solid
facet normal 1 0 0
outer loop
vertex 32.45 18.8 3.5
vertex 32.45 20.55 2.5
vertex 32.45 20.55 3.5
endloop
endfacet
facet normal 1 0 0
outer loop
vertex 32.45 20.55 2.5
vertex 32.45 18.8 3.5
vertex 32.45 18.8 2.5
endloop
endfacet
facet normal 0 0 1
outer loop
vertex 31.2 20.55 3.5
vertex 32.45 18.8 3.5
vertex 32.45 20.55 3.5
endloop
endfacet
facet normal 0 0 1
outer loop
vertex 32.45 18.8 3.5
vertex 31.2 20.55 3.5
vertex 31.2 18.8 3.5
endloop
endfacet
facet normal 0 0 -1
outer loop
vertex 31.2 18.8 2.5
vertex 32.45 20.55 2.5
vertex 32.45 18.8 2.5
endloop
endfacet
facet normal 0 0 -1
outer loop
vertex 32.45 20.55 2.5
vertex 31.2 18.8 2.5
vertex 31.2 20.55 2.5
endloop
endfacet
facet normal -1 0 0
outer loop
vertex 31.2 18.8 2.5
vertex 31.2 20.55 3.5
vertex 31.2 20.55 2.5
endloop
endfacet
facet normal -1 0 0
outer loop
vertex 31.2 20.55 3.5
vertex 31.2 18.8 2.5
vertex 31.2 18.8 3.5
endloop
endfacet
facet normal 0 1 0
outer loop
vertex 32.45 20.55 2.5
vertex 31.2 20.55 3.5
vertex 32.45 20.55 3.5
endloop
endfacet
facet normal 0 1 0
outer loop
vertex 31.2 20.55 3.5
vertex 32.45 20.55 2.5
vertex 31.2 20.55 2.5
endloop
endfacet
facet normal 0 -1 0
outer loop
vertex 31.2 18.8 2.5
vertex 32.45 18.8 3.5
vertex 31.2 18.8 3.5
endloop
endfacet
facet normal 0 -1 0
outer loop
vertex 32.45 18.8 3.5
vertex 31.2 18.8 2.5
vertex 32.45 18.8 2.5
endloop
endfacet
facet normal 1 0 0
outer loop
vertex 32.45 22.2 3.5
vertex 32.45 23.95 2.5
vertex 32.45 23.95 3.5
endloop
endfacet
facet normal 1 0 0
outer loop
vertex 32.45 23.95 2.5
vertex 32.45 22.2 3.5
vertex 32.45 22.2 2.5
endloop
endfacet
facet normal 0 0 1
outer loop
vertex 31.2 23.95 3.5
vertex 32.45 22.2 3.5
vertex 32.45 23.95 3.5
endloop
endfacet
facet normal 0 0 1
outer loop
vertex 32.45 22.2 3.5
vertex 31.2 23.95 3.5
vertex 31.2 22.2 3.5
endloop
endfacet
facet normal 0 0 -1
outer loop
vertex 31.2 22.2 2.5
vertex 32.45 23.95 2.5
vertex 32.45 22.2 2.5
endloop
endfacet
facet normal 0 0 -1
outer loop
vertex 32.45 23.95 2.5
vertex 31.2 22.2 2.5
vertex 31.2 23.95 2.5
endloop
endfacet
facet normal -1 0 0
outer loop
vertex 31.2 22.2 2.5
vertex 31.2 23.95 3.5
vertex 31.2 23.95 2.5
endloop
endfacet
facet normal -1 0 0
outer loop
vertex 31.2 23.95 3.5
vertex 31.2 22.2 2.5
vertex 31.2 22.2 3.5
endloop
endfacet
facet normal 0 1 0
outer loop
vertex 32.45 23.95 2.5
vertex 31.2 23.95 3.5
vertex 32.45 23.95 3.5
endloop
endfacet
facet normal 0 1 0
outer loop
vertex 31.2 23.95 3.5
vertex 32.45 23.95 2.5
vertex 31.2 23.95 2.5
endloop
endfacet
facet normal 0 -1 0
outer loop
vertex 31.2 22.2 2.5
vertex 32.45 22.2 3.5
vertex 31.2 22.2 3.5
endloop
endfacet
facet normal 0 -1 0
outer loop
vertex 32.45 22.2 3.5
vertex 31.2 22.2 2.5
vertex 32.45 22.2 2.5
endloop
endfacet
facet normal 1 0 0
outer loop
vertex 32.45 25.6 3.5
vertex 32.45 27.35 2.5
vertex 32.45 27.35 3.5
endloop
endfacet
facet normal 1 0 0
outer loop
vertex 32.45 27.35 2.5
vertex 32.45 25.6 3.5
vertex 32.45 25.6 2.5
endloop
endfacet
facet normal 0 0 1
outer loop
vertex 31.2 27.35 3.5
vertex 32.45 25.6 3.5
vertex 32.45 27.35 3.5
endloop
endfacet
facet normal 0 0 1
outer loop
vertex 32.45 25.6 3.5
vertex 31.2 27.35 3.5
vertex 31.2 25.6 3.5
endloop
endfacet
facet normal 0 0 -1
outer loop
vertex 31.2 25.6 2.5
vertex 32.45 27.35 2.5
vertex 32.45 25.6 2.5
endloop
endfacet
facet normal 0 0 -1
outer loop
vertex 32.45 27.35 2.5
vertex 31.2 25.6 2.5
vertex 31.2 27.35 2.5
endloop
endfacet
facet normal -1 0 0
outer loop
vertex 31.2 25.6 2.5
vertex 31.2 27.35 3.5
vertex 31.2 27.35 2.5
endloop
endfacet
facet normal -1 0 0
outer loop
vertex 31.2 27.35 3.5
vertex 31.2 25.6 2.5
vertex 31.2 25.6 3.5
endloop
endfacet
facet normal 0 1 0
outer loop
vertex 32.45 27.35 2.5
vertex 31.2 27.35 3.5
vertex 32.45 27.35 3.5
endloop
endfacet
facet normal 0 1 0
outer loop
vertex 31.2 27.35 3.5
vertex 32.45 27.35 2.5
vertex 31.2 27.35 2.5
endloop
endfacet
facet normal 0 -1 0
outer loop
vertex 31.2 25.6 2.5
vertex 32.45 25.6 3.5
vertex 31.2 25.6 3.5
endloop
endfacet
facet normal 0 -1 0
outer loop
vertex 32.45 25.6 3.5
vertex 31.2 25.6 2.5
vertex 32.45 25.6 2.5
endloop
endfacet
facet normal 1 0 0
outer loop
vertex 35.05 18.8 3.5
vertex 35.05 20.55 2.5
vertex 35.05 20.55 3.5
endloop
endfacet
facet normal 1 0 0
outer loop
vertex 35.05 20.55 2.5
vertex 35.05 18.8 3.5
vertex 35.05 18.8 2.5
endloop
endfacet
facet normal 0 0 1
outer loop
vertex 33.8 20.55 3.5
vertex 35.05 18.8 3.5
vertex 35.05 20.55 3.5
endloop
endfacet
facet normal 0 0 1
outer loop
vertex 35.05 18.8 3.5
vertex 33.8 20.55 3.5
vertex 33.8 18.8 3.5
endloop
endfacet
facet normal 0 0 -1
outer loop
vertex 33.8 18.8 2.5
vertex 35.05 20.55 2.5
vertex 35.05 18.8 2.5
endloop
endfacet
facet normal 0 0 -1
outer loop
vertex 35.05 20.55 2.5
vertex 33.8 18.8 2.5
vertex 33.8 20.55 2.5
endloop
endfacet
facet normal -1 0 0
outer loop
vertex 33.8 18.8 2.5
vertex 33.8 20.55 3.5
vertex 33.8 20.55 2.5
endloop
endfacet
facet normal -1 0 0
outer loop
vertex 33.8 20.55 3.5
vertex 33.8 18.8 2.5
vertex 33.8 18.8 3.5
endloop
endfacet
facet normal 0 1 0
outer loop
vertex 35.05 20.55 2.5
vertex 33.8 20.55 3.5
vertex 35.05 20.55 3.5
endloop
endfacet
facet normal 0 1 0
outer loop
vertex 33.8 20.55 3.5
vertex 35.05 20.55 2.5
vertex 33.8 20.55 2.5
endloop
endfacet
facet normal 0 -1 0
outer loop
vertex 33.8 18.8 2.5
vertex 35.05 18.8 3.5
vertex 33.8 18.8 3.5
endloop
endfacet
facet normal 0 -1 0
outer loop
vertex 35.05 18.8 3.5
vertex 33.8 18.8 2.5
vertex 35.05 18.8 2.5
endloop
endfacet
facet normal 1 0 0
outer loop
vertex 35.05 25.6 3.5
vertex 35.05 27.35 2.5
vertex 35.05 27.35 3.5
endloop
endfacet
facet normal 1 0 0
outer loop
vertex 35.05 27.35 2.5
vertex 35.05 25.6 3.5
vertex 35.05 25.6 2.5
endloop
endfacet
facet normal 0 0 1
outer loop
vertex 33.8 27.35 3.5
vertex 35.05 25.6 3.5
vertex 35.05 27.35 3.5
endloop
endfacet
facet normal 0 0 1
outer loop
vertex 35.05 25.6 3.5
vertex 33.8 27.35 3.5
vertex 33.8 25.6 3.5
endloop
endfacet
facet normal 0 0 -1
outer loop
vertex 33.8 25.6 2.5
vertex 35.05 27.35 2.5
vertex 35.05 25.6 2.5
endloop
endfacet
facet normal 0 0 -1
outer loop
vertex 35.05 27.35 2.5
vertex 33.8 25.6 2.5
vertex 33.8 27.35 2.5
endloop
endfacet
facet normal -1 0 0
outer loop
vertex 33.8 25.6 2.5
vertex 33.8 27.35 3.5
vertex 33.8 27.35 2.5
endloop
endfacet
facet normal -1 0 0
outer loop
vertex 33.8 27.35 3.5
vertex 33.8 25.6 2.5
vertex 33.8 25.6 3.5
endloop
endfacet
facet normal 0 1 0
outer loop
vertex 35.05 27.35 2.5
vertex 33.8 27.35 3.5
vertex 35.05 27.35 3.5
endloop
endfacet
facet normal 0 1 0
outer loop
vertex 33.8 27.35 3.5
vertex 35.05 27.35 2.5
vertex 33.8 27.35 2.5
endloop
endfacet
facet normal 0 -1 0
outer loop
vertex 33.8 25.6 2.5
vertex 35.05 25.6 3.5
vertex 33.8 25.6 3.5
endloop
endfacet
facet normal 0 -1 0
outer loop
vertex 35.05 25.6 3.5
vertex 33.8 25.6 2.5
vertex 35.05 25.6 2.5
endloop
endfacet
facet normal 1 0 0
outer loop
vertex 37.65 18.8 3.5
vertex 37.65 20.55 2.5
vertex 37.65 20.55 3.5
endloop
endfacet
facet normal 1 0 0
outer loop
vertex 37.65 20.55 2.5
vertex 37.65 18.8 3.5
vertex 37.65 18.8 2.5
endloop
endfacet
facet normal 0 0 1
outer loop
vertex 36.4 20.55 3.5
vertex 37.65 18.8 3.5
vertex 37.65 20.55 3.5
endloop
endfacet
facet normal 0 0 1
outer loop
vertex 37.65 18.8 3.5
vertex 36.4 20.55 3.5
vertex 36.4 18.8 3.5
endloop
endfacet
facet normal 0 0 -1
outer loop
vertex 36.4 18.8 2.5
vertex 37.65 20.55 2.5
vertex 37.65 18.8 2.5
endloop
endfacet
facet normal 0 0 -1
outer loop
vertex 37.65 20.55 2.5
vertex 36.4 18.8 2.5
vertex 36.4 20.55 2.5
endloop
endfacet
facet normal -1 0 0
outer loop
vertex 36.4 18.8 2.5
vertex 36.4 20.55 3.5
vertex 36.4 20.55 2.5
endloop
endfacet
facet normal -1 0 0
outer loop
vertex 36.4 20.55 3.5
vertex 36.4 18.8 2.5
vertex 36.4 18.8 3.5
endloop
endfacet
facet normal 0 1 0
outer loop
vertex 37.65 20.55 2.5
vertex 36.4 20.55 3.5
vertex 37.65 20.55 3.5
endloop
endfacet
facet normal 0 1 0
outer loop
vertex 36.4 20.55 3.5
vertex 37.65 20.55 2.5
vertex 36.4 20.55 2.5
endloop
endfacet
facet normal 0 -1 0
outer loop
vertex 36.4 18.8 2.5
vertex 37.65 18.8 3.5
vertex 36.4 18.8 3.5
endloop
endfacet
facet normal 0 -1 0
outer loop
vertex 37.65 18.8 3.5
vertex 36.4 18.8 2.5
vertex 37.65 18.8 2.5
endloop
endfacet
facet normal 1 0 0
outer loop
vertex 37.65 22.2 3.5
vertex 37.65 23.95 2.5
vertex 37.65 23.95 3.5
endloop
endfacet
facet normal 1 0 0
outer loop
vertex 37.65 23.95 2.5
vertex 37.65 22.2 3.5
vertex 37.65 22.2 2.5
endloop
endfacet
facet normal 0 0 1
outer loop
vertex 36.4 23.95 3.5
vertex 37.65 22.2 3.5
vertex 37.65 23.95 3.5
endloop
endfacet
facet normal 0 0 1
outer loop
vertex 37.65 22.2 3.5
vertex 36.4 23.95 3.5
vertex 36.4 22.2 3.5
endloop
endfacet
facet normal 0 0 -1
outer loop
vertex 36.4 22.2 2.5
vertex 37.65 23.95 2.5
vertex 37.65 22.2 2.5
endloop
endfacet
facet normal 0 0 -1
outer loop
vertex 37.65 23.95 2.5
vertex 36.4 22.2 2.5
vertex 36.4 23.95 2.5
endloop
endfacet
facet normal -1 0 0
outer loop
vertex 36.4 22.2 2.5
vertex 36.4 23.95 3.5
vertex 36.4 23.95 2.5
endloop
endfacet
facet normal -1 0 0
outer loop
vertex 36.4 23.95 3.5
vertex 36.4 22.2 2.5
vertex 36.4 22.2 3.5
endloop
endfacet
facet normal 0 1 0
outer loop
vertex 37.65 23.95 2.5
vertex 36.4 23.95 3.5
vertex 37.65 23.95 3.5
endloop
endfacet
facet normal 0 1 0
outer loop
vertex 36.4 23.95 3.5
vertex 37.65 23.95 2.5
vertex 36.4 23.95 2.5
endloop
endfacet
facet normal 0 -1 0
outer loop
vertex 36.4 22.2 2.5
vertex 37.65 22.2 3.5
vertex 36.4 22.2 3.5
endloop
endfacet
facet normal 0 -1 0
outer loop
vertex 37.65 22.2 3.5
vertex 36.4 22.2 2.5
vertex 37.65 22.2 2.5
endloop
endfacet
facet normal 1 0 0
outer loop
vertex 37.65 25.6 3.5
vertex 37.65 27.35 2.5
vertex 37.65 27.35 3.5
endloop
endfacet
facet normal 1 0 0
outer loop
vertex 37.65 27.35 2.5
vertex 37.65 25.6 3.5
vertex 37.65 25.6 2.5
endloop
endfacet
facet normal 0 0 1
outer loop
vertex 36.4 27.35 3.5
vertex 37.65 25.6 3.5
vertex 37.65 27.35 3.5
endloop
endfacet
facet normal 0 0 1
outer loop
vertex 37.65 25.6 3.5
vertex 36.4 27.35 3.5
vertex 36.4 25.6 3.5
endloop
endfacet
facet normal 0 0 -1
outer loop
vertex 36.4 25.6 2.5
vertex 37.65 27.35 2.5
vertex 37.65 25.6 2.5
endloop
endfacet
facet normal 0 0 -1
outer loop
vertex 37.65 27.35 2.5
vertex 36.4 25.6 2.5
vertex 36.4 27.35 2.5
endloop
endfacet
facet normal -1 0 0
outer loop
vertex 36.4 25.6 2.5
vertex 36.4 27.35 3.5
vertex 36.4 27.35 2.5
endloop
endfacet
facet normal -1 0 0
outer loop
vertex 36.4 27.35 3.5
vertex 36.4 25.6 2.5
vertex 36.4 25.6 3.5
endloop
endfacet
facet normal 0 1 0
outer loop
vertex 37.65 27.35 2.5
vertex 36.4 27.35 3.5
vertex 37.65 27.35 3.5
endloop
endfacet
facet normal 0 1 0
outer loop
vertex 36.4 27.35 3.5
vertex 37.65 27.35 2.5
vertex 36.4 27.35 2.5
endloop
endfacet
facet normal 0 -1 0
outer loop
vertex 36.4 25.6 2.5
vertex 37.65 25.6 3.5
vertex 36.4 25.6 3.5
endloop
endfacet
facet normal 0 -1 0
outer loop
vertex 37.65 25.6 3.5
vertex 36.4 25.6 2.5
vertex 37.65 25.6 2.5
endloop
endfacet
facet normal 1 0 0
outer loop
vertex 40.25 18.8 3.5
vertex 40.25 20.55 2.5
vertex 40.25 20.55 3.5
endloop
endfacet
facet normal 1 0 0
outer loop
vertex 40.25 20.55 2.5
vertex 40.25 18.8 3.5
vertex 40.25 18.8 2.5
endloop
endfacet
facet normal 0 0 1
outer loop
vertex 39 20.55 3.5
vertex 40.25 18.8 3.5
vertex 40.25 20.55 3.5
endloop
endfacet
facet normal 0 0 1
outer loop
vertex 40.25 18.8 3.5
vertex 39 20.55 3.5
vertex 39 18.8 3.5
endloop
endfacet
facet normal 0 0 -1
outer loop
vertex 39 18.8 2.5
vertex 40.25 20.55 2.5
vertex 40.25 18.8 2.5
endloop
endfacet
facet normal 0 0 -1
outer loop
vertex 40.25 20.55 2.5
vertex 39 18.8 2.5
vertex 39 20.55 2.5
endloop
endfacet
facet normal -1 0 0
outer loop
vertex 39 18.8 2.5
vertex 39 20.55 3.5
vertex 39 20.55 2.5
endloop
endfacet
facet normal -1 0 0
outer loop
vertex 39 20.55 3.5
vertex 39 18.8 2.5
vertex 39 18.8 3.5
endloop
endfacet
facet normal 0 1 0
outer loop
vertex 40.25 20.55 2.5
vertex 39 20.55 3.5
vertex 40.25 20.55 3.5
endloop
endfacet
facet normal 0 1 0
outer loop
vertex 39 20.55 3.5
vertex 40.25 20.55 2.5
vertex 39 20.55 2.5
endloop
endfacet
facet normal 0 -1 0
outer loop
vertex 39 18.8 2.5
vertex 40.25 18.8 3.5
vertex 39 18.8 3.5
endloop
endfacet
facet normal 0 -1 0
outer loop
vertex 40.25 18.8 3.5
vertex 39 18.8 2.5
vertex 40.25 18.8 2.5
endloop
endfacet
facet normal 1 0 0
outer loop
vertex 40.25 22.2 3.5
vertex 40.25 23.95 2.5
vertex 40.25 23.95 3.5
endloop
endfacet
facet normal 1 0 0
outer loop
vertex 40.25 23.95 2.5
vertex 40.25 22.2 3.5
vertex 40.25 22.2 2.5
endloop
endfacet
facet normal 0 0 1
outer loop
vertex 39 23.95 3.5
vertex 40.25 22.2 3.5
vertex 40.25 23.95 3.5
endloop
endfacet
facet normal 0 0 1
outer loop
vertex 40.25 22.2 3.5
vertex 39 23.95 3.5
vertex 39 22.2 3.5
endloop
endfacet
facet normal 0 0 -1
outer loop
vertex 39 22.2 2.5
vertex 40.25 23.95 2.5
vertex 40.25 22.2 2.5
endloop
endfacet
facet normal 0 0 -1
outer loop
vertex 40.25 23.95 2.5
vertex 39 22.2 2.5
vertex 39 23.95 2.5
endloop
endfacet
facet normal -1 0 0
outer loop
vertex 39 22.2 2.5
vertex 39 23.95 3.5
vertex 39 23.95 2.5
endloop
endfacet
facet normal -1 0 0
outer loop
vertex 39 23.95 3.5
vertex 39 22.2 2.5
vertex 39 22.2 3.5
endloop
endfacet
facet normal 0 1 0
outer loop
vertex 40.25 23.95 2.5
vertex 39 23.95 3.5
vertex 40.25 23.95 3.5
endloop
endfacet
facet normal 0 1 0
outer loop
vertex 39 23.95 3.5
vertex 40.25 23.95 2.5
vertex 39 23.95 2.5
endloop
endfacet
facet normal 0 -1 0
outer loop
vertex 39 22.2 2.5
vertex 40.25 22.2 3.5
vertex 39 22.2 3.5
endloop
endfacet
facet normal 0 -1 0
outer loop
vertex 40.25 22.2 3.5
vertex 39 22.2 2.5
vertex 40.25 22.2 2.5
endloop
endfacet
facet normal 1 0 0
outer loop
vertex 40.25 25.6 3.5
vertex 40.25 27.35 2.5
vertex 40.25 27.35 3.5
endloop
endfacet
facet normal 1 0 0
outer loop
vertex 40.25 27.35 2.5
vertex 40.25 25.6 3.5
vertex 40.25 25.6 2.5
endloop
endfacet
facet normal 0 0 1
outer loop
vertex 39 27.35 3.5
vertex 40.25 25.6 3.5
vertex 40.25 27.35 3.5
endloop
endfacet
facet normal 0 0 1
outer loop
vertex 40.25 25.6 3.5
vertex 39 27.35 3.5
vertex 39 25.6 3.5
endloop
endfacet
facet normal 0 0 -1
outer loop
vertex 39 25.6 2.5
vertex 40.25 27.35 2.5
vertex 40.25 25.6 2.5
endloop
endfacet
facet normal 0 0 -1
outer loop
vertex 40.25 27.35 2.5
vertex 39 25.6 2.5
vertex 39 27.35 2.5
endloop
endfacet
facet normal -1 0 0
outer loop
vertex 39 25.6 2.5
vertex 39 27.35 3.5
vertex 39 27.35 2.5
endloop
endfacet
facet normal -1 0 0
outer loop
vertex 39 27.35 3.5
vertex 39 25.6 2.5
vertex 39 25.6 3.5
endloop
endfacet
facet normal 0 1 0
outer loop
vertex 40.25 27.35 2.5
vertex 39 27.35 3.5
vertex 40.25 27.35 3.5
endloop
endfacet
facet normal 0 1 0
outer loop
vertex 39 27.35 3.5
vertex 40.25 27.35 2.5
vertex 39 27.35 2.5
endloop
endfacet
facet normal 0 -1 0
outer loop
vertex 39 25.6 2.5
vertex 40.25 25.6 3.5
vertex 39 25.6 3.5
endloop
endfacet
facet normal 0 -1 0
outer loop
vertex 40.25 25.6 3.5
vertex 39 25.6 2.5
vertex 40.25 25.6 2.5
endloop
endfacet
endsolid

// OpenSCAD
union() {
  for (ix = [0:3]) {
    for (iy = [0:2]) {
      if (!(ix == 1 && iy == 1)) {
        translate([31.2 + ix * 2.6, 18.8 + iy * 3.4, 2.5]) cube(size=[1.25,1.75,1.0], center=false);
      }
    }
  }
}
